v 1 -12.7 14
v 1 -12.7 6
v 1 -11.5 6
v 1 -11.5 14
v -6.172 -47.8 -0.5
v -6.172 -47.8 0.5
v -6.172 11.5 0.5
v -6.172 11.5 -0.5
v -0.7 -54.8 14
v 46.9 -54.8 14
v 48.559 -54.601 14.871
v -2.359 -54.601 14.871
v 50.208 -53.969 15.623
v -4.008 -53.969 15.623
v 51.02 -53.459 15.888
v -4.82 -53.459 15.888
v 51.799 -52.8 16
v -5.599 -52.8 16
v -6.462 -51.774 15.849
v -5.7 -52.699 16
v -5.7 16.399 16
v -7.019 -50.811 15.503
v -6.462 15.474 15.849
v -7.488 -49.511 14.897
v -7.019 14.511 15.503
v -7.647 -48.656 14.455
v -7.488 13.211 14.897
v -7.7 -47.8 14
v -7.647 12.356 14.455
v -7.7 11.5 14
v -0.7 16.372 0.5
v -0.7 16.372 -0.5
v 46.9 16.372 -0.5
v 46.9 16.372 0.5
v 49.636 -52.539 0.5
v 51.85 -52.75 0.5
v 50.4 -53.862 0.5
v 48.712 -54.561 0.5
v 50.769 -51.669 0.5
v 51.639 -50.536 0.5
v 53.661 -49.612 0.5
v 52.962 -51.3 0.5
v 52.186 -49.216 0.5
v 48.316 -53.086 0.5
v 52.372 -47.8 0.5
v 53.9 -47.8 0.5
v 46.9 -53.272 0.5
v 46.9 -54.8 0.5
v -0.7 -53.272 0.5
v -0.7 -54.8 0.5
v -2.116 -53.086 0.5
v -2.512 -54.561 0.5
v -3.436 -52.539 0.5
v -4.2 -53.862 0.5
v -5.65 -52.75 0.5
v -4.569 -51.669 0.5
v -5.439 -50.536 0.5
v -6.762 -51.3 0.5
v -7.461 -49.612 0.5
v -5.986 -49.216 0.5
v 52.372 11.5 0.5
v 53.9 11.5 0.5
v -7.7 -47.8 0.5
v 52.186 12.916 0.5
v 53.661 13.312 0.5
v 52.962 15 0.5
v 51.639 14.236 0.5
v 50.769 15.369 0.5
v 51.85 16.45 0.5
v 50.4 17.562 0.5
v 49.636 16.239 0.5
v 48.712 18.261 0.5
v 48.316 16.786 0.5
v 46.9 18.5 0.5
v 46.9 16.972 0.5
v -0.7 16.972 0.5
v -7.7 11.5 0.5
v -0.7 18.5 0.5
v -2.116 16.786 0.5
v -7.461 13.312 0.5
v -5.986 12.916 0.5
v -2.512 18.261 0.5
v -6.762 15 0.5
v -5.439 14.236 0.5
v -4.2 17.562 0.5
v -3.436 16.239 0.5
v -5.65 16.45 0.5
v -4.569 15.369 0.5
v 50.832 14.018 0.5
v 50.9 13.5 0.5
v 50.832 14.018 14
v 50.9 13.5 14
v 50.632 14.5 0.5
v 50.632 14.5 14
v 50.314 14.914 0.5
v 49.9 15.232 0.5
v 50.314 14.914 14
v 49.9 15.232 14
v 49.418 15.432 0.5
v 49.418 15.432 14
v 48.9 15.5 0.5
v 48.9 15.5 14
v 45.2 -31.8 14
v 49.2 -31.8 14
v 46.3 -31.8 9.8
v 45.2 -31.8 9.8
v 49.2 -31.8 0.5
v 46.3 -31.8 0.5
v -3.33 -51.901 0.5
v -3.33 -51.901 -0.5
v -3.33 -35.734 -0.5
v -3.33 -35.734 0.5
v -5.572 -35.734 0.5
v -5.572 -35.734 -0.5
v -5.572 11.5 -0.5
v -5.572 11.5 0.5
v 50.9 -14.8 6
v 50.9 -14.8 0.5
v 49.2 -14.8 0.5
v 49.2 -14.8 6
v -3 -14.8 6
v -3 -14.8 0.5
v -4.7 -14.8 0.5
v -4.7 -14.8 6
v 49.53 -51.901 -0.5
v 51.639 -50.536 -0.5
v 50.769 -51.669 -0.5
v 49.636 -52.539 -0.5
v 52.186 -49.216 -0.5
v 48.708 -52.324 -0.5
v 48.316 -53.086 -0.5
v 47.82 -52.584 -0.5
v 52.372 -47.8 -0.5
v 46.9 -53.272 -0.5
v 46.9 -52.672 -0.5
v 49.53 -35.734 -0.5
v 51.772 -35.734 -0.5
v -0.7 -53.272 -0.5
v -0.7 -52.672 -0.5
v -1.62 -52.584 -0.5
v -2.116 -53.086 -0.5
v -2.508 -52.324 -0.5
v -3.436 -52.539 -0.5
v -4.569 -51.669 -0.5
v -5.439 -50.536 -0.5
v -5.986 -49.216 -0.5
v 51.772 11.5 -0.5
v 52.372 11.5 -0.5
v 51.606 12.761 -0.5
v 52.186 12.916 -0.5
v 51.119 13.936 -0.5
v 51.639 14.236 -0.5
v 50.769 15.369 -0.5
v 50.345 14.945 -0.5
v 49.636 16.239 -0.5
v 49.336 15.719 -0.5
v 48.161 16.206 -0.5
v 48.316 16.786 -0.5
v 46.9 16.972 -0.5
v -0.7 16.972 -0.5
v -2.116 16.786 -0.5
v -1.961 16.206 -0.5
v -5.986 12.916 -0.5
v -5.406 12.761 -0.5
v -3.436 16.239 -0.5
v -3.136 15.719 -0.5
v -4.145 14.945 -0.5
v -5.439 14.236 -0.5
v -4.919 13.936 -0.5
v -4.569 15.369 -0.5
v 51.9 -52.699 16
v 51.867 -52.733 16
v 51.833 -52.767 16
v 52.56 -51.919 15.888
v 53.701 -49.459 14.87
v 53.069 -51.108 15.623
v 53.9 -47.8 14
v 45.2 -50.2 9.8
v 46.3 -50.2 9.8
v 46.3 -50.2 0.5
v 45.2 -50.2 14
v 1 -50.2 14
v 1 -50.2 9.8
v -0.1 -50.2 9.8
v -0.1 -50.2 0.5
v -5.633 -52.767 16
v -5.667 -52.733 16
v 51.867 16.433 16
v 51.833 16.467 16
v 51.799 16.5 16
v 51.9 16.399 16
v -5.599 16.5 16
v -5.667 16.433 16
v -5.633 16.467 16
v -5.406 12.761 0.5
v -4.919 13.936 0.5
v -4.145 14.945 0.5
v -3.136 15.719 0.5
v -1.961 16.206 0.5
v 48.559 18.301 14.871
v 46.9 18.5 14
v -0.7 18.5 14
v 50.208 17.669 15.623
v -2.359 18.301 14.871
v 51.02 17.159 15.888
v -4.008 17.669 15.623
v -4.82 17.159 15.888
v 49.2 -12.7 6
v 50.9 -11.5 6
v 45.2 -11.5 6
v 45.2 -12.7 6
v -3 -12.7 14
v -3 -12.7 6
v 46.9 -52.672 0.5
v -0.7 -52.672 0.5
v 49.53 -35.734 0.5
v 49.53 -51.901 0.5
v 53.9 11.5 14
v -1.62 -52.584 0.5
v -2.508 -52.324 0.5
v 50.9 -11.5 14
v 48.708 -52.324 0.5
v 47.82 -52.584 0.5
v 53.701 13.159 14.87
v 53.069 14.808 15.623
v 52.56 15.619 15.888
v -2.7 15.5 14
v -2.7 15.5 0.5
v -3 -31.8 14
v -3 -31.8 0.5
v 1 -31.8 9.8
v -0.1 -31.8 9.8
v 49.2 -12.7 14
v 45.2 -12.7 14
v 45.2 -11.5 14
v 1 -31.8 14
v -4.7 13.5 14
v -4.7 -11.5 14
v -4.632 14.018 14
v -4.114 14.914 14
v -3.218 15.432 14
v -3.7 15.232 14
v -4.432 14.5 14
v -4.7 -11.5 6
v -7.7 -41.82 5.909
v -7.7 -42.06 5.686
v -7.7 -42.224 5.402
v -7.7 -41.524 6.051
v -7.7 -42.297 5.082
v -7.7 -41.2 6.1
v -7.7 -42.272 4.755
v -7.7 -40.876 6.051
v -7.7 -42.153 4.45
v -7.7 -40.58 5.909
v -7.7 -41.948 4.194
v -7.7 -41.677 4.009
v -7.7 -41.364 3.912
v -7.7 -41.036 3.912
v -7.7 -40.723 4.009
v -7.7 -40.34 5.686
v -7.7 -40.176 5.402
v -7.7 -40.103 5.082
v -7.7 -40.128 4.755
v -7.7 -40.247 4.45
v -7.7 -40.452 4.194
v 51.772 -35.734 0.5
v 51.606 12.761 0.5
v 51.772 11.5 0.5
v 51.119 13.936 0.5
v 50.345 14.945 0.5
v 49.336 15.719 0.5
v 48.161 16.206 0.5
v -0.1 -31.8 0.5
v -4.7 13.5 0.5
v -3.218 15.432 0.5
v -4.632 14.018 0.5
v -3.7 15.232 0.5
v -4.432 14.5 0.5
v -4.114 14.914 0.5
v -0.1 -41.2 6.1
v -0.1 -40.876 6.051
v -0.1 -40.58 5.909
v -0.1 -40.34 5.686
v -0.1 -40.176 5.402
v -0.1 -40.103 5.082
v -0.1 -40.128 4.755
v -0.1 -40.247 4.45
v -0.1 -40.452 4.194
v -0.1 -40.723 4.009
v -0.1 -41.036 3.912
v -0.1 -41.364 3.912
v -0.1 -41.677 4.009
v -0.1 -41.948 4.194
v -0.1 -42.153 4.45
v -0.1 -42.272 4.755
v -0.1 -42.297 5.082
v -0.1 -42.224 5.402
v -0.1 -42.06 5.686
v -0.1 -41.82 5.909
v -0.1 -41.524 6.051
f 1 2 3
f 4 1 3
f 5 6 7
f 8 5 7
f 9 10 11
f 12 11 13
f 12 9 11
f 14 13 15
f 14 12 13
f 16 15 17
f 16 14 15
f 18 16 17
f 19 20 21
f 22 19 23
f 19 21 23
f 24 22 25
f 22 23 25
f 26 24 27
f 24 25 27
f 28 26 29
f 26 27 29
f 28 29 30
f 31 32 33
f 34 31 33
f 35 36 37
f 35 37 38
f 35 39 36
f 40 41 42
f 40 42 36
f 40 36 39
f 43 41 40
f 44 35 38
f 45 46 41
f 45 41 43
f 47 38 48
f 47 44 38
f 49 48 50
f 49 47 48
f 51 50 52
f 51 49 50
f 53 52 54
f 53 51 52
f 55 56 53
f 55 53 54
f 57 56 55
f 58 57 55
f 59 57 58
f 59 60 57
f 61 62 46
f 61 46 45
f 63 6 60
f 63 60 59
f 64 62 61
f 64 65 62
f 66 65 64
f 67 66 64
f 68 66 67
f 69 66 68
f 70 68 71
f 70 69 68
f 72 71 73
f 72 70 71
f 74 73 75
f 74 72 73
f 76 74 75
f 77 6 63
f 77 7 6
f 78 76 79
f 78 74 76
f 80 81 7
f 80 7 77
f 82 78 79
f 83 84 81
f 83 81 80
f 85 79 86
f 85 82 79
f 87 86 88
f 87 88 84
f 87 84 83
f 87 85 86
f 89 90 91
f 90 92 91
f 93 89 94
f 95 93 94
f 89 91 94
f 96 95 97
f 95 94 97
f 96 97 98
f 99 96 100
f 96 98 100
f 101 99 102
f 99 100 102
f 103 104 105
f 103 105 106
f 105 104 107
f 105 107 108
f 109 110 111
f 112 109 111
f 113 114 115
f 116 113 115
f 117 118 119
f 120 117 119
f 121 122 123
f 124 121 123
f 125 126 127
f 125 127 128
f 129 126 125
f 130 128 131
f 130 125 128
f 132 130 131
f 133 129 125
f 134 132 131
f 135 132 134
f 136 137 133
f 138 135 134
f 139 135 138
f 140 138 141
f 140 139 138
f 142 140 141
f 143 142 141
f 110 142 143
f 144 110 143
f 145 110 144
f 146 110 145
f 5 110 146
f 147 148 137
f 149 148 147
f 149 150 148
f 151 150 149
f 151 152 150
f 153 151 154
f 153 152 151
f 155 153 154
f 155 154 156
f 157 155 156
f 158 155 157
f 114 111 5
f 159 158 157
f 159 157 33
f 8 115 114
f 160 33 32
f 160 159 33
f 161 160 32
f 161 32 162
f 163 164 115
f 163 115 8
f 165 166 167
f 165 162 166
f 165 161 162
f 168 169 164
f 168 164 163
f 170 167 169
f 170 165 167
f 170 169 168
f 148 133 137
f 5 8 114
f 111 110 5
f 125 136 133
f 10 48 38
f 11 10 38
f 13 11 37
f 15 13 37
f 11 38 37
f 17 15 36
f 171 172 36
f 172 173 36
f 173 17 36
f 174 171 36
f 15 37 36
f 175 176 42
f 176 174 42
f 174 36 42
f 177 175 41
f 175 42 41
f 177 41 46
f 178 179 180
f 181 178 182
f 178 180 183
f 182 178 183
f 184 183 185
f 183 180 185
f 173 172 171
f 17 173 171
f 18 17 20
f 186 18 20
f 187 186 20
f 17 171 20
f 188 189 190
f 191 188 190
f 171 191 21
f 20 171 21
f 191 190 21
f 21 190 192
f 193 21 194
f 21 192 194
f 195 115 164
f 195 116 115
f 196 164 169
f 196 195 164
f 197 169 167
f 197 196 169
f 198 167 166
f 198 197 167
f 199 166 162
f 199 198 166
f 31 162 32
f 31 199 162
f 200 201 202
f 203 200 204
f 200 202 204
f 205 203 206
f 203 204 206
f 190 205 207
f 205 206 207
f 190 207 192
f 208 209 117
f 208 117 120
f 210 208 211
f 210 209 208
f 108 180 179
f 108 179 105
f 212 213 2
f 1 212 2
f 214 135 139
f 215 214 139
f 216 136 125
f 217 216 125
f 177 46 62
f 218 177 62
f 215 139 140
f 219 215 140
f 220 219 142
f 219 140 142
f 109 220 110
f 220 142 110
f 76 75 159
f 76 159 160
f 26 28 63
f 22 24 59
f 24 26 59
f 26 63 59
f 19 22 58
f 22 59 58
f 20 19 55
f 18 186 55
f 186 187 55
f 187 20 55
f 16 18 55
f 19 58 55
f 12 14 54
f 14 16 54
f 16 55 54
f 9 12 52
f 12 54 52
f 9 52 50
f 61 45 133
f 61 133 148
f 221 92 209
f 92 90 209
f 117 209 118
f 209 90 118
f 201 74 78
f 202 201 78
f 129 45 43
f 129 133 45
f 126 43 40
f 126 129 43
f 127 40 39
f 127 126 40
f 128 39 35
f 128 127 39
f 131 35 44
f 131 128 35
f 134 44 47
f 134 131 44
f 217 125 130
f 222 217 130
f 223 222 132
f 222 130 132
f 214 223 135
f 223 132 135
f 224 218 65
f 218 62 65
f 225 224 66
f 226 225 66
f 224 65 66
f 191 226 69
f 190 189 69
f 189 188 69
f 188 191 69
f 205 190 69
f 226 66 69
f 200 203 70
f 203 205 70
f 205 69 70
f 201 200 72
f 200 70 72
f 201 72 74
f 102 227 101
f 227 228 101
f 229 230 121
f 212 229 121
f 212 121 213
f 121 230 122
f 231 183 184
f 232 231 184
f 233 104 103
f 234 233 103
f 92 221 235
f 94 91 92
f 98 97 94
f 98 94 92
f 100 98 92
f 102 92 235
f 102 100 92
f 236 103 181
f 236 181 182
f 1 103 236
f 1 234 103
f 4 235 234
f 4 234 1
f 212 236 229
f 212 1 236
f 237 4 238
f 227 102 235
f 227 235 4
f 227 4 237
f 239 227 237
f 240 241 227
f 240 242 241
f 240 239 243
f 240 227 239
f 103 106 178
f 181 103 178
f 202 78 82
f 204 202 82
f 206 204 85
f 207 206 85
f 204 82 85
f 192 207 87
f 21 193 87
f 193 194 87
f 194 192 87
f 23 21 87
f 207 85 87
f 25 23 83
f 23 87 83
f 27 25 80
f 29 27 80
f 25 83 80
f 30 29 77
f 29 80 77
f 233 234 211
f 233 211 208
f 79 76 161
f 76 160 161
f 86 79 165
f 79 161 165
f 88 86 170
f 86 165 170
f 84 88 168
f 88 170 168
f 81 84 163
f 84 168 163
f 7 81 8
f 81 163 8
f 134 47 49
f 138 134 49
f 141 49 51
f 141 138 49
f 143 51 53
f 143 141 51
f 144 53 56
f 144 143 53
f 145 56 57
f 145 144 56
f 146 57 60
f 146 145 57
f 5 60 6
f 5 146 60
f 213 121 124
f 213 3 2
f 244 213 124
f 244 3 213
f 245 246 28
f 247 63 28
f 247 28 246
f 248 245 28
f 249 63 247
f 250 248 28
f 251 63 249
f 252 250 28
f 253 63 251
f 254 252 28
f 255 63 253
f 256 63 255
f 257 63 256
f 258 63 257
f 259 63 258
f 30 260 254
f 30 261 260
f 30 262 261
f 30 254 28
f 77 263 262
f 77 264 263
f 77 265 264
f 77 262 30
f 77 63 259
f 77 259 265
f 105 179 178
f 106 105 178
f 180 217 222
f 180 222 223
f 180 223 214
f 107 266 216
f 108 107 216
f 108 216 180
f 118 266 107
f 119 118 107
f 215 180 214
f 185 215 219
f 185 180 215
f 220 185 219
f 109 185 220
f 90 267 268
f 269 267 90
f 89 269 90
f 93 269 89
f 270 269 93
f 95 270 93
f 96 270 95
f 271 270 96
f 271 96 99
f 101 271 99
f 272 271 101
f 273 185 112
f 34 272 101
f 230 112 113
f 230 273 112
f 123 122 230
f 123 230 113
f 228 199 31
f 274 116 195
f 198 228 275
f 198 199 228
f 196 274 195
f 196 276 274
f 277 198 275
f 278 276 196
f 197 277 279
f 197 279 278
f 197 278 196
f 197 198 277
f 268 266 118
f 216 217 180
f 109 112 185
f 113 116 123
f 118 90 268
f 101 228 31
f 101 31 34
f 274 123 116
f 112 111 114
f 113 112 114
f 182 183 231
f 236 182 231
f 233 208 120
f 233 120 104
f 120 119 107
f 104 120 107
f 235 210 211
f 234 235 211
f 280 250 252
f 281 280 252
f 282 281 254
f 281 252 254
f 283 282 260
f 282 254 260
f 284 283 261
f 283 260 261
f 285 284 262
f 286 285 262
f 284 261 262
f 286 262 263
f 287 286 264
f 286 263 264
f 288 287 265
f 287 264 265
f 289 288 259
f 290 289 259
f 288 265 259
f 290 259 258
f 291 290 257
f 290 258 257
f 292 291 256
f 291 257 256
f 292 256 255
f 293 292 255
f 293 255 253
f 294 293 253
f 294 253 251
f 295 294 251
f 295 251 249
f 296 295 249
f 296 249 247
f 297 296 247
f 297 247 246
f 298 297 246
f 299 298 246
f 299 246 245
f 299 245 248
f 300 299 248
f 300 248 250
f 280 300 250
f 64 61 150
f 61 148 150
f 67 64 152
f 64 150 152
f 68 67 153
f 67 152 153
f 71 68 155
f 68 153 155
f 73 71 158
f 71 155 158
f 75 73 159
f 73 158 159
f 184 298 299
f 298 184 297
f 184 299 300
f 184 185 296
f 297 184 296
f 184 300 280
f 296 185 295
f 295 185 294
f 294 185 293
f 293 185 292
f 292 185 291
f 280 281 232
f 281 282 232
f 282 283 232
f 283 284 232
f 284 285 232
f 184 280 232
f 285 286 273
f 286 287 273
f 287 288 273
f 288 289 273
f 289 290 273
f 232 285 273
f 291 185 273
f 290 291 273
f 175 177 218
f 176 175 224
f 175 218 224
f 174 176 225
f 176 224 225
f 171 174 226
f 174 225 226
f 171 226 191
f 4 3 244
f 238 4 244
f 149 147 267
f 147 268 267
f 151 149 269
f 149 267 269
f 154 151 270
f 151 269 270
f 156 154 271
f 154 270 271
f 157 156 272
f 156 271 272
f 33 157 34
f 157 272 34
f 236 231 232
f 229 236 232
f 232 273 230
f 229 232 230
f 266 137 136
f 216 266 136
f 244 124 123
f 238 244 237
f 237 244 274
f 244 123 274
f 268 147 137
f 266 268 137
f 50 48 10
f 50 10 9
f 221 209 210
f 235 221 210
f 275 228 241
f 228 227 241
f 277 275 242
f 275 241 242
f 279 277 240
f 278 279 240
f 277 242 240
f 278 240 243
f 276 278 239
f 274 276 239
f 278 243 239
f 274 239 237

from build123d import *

# Parameters (mm, degrees)
SKETCH1_W                      = 61.6
SKETCH1_H                      = 73.3
BOSS_EXTRUDE1_DEPTH            = 15.5
SKETCH2_W                      = 58.544
SKETCH2_H                      = 70.244
BOSS_EXTRUDE2_DEPTH            = 1
CUT_EXTRUDE1_DEPTH             = 1
CUT_EXTRUDE2_DEPTH             = 5.5
CUT_EXTRUDE3_DEPTH             = 8
SKETCH6_W                      = 1.1
SKETCH6_H                      = 18.4
CUT_EXTRUDE4_DEPTH             = 9.3
SKETCH7_W                      = 1.1
SKETCH7_H                      = 18.4
CUT_EXTRUDE5_DEPTH             = 9.3
F_2_2_2_2_DIAMETER_HOLE1_D     = 2.2
F_2_2_2_2_DIAMETER_HOLE1_DEPTH = 7.6
FILLET1_R                      = 2
FILLET2_R                      = 4.871984114
FILLET3_R                      = 5.472
FILLET4_R                      = 7


with BuildPart() as part:
    # Sketch1 → Boss-Extrude1 (new body)
    with BuildSketch(Plane(origin=(0, 0, 0.5), x_dir=(-1, 0, 0), z_dir=(0, 0, -1))):
        with Locations((-23.1, -18.15)):
            Rectangle(SKETCH1_W, SKETCH1_H)
    extrude(amount=-BOSS_EXTRUDE1_DEPTH)

    # Sketch2 → Boss-Extrude2 (add)
    with BuildSketch(Plane(origin=(0, 0, 0.5), x_dir=(-1, 0, 0), z_dir=(0, 0, -1))):
        with Locations((-23.1, -18.15)):
            Rectangle(SKETCH2_W, SKETCH2_H)
    extrude(amount=BOSS_EXTRUDE2_DEPTH)

    # Sketch3 → Cut-Extrude1 (cut)
    with BuildSketch(Plane(origin=(0, 0, -0.5), x_dir=(-1, 0, 0), z_dir=(0, 0, -1))):
        with BuildLine():
            Line((-51.771984114, 16.371984114), (-51.771984114, -35.734235116))
            Line((-51.771984114, -35.734235116), (-49.52987247, -35.734235116))
            Line((-49.52987247, -35.734235116), (-49.52987247, -51.901219331))
            ThreePointArc((-49.52987247, -51.901219331), (-48.270247018, -52.475323766), (-46.9, -52.671984114))
            Line((-46.9, -52.671984114), (0.7, -52.671984114))
            ThreePointArc((0.7, -52.671984114), (2.070247018, -52.475323766), (3.32987247, -51.901219331))
            Line((3.32987247, -51.901219331), (3.32987247, -35.734235116))
            Line((3.32987247, -35.734235116), (5.571984114, -35.734235116))
            Line((5.571984114, -35.734235116), (5.571984114, 16.371984114))
            Line((5.571984114, 16.371984114), (-51.771984114, 16.371984114))
        make_face()
    extrude(amount=-CUT_EXTRUDE1_DEPTH, mode=Mode.SUBTRACT)

    # Sketch4 → Cut-Extrude2 (cut)
    with BuildSketch(Plane(origin=(0, 0, 0.5), x_dir=(-1, 0, 0), z_dir=(0, 0, -1))):
        Polygon((3, -14.8), (4.7, -14.8), (4.7, 15.5), (-50.9, 15.5), (-50.9, -14.8), (-49.2, -14.8), (-49.2, -31.8), (-45.2, -31.8), (-45.2, -50.2), (-1, -50.2), (-1, -31.8), (3, -31.8), align=None)
    extrude(amount=-CUT_EXTRUDE2_DEPTH, mode=Mode.SUBTRACT)

    # Sketch5 → Cut-Extrude3 (cut)
    with BuildSketch(Plane(origin=(0, 0, 6), x_dir=(-1, 0, 0), z_dir=(0, 0, -1))):
        Polygon((3, -12.7), (-1, -12.7), (-1, -11.5), (4.7, -11.5), (4.7, 15.5), (-50.9, 15.5), (-50.9, -11.5), (-45.2, -11.5), (-45.2, -12.7), (-49.2, -12.7), (-49.2, -31.8), (-45.2, -31.8), (-45.2, -50.2), (-1, -50.2), (-1, -31.8), (3, -31.8), align=None)
    extrude(amount=-CUT_EXTRUDE3_DEPTH, mode=Mode.SUBTRACT)

    # Sketch6 → Cut-Extrude4 (cut)
    with BuildSketch(Plane(origin=(0, 0, 0.5), x_dir=(-1, 0, 0), z_dir=(0, 0, -1))):
        with Locations((-45.75, -41)):
            Rectangle(SKETCH6_W, SKETCH6_H)
    extrude(amount=-CUT_EXTRUDE4_DEPTH, mode=Mode.SUBTRACT)

    # Sketch7 → Cut-Extrude5 (cut)
    with BuildSketch(Plane(origin=(0, 0, 0.5), x_dir=(-1, 0, 0), z_dir=(0, 0, -1))):
        with Locations((-0.45, -41)):
            Rectangle(SKETCH7_W, SKETCH7_H)
    extrude(amount=-CUT_EXTRUDE5_DEPTH, mode=Mode.SUBTRACT)

    # Ø2.2 (2.2) Diameter Hole1
    with Locations(Plane(origin=(-0.1, 0, 0), x_dir=(0, 0, -1), z_dir=(1, 0, 0))):
        with Locations((-5, -41.2)):
            Hole(F_2_2_2_2_DIAMETER_HOLE1_D / 2, depth=F_2_2_2_2_DIAMETER_HOLE1_DEPTH)

    # Fillet1
    fillet1_edges = [part.edges().sort_by_distance(p)[0] for p in [
        (23.1, -54.8, 16),
        (-7.7, -18.15, 16),
        (23.1, 18.5, 16),
        (50.9, 15.5, 7.25),
        (-4.7, 15.5, 7.25),
        (53.9, -18.15, 16),
    ]]
    fillet(fillet1_edges, radius=FILLET1_R)

    # Fillet2
    fillet2_edges = [part.edges().sort_by_distance(p)[0] for p in [
        (51.771984114, 16.371984114, 0),
        (-5.571984114, 16.371984114, 0),
    ]]
    fillet(fillet2_edges, radius=FILLET2_R)

    # Fillet3
    fillet3_edges = [part.edges().sort_by_distance(p)[0] for p in [
        (52.372, 16.972, 0),
        (52.372, -53.272, 0),
        (-6.172, -53.272, 0),
        (-6.172, 16.972, 0),
    ]]
    fillet(fillet3_edges, radius=FILLET3_R)

    # Fillet4
    # the kernel refuses this fillet: 7 mm, written as the material it takes off along each edge
    with BuildSketch(Plane(origin=(-7.7, -54.8, -17), x_dir=(1, 0, 0), z_dir=(0, 0, 1)), Plane(origin=(53.9, -54.8, -17), x_dir=(0, 1, 0), z_dir=(0, 0, 1))) as fillet4_piece_1:
        with BuildLine():
            CenterArc((FILLET4_R, FILLET4_R), FILLET4_R, 180, 90)
            Line((0, FILLET4_R), (0, 0))
            Line((0, 0), (FILLET4_R, 0))
        make_face()
    extrude(amount=48.5, mode=Mode.SUBTRACT)
    with BuildSketch(Plane(origin=(-7.7, 18.5, -17), x_dir=(1, 0, 0), z_dir=(0, 0, 1)), Plane(origin=(53.9, 18.5, -17), x_dir=(0, -1, 0), z_dir=(0, 0, 1))) as fillet4_piece_2:
        with BuildLine():
            CenterArc((FILLET4_R, -FILLET4_R), FILLET4_R, 90, 90)
            Line((0, -FILLET4_R), (0, 0))
            Line((0, 0), (FILLET4_R, 0))
        make_face()
    extrude(amount=48.5, mode=Mode.SUBTRACT)


solid = part.part
